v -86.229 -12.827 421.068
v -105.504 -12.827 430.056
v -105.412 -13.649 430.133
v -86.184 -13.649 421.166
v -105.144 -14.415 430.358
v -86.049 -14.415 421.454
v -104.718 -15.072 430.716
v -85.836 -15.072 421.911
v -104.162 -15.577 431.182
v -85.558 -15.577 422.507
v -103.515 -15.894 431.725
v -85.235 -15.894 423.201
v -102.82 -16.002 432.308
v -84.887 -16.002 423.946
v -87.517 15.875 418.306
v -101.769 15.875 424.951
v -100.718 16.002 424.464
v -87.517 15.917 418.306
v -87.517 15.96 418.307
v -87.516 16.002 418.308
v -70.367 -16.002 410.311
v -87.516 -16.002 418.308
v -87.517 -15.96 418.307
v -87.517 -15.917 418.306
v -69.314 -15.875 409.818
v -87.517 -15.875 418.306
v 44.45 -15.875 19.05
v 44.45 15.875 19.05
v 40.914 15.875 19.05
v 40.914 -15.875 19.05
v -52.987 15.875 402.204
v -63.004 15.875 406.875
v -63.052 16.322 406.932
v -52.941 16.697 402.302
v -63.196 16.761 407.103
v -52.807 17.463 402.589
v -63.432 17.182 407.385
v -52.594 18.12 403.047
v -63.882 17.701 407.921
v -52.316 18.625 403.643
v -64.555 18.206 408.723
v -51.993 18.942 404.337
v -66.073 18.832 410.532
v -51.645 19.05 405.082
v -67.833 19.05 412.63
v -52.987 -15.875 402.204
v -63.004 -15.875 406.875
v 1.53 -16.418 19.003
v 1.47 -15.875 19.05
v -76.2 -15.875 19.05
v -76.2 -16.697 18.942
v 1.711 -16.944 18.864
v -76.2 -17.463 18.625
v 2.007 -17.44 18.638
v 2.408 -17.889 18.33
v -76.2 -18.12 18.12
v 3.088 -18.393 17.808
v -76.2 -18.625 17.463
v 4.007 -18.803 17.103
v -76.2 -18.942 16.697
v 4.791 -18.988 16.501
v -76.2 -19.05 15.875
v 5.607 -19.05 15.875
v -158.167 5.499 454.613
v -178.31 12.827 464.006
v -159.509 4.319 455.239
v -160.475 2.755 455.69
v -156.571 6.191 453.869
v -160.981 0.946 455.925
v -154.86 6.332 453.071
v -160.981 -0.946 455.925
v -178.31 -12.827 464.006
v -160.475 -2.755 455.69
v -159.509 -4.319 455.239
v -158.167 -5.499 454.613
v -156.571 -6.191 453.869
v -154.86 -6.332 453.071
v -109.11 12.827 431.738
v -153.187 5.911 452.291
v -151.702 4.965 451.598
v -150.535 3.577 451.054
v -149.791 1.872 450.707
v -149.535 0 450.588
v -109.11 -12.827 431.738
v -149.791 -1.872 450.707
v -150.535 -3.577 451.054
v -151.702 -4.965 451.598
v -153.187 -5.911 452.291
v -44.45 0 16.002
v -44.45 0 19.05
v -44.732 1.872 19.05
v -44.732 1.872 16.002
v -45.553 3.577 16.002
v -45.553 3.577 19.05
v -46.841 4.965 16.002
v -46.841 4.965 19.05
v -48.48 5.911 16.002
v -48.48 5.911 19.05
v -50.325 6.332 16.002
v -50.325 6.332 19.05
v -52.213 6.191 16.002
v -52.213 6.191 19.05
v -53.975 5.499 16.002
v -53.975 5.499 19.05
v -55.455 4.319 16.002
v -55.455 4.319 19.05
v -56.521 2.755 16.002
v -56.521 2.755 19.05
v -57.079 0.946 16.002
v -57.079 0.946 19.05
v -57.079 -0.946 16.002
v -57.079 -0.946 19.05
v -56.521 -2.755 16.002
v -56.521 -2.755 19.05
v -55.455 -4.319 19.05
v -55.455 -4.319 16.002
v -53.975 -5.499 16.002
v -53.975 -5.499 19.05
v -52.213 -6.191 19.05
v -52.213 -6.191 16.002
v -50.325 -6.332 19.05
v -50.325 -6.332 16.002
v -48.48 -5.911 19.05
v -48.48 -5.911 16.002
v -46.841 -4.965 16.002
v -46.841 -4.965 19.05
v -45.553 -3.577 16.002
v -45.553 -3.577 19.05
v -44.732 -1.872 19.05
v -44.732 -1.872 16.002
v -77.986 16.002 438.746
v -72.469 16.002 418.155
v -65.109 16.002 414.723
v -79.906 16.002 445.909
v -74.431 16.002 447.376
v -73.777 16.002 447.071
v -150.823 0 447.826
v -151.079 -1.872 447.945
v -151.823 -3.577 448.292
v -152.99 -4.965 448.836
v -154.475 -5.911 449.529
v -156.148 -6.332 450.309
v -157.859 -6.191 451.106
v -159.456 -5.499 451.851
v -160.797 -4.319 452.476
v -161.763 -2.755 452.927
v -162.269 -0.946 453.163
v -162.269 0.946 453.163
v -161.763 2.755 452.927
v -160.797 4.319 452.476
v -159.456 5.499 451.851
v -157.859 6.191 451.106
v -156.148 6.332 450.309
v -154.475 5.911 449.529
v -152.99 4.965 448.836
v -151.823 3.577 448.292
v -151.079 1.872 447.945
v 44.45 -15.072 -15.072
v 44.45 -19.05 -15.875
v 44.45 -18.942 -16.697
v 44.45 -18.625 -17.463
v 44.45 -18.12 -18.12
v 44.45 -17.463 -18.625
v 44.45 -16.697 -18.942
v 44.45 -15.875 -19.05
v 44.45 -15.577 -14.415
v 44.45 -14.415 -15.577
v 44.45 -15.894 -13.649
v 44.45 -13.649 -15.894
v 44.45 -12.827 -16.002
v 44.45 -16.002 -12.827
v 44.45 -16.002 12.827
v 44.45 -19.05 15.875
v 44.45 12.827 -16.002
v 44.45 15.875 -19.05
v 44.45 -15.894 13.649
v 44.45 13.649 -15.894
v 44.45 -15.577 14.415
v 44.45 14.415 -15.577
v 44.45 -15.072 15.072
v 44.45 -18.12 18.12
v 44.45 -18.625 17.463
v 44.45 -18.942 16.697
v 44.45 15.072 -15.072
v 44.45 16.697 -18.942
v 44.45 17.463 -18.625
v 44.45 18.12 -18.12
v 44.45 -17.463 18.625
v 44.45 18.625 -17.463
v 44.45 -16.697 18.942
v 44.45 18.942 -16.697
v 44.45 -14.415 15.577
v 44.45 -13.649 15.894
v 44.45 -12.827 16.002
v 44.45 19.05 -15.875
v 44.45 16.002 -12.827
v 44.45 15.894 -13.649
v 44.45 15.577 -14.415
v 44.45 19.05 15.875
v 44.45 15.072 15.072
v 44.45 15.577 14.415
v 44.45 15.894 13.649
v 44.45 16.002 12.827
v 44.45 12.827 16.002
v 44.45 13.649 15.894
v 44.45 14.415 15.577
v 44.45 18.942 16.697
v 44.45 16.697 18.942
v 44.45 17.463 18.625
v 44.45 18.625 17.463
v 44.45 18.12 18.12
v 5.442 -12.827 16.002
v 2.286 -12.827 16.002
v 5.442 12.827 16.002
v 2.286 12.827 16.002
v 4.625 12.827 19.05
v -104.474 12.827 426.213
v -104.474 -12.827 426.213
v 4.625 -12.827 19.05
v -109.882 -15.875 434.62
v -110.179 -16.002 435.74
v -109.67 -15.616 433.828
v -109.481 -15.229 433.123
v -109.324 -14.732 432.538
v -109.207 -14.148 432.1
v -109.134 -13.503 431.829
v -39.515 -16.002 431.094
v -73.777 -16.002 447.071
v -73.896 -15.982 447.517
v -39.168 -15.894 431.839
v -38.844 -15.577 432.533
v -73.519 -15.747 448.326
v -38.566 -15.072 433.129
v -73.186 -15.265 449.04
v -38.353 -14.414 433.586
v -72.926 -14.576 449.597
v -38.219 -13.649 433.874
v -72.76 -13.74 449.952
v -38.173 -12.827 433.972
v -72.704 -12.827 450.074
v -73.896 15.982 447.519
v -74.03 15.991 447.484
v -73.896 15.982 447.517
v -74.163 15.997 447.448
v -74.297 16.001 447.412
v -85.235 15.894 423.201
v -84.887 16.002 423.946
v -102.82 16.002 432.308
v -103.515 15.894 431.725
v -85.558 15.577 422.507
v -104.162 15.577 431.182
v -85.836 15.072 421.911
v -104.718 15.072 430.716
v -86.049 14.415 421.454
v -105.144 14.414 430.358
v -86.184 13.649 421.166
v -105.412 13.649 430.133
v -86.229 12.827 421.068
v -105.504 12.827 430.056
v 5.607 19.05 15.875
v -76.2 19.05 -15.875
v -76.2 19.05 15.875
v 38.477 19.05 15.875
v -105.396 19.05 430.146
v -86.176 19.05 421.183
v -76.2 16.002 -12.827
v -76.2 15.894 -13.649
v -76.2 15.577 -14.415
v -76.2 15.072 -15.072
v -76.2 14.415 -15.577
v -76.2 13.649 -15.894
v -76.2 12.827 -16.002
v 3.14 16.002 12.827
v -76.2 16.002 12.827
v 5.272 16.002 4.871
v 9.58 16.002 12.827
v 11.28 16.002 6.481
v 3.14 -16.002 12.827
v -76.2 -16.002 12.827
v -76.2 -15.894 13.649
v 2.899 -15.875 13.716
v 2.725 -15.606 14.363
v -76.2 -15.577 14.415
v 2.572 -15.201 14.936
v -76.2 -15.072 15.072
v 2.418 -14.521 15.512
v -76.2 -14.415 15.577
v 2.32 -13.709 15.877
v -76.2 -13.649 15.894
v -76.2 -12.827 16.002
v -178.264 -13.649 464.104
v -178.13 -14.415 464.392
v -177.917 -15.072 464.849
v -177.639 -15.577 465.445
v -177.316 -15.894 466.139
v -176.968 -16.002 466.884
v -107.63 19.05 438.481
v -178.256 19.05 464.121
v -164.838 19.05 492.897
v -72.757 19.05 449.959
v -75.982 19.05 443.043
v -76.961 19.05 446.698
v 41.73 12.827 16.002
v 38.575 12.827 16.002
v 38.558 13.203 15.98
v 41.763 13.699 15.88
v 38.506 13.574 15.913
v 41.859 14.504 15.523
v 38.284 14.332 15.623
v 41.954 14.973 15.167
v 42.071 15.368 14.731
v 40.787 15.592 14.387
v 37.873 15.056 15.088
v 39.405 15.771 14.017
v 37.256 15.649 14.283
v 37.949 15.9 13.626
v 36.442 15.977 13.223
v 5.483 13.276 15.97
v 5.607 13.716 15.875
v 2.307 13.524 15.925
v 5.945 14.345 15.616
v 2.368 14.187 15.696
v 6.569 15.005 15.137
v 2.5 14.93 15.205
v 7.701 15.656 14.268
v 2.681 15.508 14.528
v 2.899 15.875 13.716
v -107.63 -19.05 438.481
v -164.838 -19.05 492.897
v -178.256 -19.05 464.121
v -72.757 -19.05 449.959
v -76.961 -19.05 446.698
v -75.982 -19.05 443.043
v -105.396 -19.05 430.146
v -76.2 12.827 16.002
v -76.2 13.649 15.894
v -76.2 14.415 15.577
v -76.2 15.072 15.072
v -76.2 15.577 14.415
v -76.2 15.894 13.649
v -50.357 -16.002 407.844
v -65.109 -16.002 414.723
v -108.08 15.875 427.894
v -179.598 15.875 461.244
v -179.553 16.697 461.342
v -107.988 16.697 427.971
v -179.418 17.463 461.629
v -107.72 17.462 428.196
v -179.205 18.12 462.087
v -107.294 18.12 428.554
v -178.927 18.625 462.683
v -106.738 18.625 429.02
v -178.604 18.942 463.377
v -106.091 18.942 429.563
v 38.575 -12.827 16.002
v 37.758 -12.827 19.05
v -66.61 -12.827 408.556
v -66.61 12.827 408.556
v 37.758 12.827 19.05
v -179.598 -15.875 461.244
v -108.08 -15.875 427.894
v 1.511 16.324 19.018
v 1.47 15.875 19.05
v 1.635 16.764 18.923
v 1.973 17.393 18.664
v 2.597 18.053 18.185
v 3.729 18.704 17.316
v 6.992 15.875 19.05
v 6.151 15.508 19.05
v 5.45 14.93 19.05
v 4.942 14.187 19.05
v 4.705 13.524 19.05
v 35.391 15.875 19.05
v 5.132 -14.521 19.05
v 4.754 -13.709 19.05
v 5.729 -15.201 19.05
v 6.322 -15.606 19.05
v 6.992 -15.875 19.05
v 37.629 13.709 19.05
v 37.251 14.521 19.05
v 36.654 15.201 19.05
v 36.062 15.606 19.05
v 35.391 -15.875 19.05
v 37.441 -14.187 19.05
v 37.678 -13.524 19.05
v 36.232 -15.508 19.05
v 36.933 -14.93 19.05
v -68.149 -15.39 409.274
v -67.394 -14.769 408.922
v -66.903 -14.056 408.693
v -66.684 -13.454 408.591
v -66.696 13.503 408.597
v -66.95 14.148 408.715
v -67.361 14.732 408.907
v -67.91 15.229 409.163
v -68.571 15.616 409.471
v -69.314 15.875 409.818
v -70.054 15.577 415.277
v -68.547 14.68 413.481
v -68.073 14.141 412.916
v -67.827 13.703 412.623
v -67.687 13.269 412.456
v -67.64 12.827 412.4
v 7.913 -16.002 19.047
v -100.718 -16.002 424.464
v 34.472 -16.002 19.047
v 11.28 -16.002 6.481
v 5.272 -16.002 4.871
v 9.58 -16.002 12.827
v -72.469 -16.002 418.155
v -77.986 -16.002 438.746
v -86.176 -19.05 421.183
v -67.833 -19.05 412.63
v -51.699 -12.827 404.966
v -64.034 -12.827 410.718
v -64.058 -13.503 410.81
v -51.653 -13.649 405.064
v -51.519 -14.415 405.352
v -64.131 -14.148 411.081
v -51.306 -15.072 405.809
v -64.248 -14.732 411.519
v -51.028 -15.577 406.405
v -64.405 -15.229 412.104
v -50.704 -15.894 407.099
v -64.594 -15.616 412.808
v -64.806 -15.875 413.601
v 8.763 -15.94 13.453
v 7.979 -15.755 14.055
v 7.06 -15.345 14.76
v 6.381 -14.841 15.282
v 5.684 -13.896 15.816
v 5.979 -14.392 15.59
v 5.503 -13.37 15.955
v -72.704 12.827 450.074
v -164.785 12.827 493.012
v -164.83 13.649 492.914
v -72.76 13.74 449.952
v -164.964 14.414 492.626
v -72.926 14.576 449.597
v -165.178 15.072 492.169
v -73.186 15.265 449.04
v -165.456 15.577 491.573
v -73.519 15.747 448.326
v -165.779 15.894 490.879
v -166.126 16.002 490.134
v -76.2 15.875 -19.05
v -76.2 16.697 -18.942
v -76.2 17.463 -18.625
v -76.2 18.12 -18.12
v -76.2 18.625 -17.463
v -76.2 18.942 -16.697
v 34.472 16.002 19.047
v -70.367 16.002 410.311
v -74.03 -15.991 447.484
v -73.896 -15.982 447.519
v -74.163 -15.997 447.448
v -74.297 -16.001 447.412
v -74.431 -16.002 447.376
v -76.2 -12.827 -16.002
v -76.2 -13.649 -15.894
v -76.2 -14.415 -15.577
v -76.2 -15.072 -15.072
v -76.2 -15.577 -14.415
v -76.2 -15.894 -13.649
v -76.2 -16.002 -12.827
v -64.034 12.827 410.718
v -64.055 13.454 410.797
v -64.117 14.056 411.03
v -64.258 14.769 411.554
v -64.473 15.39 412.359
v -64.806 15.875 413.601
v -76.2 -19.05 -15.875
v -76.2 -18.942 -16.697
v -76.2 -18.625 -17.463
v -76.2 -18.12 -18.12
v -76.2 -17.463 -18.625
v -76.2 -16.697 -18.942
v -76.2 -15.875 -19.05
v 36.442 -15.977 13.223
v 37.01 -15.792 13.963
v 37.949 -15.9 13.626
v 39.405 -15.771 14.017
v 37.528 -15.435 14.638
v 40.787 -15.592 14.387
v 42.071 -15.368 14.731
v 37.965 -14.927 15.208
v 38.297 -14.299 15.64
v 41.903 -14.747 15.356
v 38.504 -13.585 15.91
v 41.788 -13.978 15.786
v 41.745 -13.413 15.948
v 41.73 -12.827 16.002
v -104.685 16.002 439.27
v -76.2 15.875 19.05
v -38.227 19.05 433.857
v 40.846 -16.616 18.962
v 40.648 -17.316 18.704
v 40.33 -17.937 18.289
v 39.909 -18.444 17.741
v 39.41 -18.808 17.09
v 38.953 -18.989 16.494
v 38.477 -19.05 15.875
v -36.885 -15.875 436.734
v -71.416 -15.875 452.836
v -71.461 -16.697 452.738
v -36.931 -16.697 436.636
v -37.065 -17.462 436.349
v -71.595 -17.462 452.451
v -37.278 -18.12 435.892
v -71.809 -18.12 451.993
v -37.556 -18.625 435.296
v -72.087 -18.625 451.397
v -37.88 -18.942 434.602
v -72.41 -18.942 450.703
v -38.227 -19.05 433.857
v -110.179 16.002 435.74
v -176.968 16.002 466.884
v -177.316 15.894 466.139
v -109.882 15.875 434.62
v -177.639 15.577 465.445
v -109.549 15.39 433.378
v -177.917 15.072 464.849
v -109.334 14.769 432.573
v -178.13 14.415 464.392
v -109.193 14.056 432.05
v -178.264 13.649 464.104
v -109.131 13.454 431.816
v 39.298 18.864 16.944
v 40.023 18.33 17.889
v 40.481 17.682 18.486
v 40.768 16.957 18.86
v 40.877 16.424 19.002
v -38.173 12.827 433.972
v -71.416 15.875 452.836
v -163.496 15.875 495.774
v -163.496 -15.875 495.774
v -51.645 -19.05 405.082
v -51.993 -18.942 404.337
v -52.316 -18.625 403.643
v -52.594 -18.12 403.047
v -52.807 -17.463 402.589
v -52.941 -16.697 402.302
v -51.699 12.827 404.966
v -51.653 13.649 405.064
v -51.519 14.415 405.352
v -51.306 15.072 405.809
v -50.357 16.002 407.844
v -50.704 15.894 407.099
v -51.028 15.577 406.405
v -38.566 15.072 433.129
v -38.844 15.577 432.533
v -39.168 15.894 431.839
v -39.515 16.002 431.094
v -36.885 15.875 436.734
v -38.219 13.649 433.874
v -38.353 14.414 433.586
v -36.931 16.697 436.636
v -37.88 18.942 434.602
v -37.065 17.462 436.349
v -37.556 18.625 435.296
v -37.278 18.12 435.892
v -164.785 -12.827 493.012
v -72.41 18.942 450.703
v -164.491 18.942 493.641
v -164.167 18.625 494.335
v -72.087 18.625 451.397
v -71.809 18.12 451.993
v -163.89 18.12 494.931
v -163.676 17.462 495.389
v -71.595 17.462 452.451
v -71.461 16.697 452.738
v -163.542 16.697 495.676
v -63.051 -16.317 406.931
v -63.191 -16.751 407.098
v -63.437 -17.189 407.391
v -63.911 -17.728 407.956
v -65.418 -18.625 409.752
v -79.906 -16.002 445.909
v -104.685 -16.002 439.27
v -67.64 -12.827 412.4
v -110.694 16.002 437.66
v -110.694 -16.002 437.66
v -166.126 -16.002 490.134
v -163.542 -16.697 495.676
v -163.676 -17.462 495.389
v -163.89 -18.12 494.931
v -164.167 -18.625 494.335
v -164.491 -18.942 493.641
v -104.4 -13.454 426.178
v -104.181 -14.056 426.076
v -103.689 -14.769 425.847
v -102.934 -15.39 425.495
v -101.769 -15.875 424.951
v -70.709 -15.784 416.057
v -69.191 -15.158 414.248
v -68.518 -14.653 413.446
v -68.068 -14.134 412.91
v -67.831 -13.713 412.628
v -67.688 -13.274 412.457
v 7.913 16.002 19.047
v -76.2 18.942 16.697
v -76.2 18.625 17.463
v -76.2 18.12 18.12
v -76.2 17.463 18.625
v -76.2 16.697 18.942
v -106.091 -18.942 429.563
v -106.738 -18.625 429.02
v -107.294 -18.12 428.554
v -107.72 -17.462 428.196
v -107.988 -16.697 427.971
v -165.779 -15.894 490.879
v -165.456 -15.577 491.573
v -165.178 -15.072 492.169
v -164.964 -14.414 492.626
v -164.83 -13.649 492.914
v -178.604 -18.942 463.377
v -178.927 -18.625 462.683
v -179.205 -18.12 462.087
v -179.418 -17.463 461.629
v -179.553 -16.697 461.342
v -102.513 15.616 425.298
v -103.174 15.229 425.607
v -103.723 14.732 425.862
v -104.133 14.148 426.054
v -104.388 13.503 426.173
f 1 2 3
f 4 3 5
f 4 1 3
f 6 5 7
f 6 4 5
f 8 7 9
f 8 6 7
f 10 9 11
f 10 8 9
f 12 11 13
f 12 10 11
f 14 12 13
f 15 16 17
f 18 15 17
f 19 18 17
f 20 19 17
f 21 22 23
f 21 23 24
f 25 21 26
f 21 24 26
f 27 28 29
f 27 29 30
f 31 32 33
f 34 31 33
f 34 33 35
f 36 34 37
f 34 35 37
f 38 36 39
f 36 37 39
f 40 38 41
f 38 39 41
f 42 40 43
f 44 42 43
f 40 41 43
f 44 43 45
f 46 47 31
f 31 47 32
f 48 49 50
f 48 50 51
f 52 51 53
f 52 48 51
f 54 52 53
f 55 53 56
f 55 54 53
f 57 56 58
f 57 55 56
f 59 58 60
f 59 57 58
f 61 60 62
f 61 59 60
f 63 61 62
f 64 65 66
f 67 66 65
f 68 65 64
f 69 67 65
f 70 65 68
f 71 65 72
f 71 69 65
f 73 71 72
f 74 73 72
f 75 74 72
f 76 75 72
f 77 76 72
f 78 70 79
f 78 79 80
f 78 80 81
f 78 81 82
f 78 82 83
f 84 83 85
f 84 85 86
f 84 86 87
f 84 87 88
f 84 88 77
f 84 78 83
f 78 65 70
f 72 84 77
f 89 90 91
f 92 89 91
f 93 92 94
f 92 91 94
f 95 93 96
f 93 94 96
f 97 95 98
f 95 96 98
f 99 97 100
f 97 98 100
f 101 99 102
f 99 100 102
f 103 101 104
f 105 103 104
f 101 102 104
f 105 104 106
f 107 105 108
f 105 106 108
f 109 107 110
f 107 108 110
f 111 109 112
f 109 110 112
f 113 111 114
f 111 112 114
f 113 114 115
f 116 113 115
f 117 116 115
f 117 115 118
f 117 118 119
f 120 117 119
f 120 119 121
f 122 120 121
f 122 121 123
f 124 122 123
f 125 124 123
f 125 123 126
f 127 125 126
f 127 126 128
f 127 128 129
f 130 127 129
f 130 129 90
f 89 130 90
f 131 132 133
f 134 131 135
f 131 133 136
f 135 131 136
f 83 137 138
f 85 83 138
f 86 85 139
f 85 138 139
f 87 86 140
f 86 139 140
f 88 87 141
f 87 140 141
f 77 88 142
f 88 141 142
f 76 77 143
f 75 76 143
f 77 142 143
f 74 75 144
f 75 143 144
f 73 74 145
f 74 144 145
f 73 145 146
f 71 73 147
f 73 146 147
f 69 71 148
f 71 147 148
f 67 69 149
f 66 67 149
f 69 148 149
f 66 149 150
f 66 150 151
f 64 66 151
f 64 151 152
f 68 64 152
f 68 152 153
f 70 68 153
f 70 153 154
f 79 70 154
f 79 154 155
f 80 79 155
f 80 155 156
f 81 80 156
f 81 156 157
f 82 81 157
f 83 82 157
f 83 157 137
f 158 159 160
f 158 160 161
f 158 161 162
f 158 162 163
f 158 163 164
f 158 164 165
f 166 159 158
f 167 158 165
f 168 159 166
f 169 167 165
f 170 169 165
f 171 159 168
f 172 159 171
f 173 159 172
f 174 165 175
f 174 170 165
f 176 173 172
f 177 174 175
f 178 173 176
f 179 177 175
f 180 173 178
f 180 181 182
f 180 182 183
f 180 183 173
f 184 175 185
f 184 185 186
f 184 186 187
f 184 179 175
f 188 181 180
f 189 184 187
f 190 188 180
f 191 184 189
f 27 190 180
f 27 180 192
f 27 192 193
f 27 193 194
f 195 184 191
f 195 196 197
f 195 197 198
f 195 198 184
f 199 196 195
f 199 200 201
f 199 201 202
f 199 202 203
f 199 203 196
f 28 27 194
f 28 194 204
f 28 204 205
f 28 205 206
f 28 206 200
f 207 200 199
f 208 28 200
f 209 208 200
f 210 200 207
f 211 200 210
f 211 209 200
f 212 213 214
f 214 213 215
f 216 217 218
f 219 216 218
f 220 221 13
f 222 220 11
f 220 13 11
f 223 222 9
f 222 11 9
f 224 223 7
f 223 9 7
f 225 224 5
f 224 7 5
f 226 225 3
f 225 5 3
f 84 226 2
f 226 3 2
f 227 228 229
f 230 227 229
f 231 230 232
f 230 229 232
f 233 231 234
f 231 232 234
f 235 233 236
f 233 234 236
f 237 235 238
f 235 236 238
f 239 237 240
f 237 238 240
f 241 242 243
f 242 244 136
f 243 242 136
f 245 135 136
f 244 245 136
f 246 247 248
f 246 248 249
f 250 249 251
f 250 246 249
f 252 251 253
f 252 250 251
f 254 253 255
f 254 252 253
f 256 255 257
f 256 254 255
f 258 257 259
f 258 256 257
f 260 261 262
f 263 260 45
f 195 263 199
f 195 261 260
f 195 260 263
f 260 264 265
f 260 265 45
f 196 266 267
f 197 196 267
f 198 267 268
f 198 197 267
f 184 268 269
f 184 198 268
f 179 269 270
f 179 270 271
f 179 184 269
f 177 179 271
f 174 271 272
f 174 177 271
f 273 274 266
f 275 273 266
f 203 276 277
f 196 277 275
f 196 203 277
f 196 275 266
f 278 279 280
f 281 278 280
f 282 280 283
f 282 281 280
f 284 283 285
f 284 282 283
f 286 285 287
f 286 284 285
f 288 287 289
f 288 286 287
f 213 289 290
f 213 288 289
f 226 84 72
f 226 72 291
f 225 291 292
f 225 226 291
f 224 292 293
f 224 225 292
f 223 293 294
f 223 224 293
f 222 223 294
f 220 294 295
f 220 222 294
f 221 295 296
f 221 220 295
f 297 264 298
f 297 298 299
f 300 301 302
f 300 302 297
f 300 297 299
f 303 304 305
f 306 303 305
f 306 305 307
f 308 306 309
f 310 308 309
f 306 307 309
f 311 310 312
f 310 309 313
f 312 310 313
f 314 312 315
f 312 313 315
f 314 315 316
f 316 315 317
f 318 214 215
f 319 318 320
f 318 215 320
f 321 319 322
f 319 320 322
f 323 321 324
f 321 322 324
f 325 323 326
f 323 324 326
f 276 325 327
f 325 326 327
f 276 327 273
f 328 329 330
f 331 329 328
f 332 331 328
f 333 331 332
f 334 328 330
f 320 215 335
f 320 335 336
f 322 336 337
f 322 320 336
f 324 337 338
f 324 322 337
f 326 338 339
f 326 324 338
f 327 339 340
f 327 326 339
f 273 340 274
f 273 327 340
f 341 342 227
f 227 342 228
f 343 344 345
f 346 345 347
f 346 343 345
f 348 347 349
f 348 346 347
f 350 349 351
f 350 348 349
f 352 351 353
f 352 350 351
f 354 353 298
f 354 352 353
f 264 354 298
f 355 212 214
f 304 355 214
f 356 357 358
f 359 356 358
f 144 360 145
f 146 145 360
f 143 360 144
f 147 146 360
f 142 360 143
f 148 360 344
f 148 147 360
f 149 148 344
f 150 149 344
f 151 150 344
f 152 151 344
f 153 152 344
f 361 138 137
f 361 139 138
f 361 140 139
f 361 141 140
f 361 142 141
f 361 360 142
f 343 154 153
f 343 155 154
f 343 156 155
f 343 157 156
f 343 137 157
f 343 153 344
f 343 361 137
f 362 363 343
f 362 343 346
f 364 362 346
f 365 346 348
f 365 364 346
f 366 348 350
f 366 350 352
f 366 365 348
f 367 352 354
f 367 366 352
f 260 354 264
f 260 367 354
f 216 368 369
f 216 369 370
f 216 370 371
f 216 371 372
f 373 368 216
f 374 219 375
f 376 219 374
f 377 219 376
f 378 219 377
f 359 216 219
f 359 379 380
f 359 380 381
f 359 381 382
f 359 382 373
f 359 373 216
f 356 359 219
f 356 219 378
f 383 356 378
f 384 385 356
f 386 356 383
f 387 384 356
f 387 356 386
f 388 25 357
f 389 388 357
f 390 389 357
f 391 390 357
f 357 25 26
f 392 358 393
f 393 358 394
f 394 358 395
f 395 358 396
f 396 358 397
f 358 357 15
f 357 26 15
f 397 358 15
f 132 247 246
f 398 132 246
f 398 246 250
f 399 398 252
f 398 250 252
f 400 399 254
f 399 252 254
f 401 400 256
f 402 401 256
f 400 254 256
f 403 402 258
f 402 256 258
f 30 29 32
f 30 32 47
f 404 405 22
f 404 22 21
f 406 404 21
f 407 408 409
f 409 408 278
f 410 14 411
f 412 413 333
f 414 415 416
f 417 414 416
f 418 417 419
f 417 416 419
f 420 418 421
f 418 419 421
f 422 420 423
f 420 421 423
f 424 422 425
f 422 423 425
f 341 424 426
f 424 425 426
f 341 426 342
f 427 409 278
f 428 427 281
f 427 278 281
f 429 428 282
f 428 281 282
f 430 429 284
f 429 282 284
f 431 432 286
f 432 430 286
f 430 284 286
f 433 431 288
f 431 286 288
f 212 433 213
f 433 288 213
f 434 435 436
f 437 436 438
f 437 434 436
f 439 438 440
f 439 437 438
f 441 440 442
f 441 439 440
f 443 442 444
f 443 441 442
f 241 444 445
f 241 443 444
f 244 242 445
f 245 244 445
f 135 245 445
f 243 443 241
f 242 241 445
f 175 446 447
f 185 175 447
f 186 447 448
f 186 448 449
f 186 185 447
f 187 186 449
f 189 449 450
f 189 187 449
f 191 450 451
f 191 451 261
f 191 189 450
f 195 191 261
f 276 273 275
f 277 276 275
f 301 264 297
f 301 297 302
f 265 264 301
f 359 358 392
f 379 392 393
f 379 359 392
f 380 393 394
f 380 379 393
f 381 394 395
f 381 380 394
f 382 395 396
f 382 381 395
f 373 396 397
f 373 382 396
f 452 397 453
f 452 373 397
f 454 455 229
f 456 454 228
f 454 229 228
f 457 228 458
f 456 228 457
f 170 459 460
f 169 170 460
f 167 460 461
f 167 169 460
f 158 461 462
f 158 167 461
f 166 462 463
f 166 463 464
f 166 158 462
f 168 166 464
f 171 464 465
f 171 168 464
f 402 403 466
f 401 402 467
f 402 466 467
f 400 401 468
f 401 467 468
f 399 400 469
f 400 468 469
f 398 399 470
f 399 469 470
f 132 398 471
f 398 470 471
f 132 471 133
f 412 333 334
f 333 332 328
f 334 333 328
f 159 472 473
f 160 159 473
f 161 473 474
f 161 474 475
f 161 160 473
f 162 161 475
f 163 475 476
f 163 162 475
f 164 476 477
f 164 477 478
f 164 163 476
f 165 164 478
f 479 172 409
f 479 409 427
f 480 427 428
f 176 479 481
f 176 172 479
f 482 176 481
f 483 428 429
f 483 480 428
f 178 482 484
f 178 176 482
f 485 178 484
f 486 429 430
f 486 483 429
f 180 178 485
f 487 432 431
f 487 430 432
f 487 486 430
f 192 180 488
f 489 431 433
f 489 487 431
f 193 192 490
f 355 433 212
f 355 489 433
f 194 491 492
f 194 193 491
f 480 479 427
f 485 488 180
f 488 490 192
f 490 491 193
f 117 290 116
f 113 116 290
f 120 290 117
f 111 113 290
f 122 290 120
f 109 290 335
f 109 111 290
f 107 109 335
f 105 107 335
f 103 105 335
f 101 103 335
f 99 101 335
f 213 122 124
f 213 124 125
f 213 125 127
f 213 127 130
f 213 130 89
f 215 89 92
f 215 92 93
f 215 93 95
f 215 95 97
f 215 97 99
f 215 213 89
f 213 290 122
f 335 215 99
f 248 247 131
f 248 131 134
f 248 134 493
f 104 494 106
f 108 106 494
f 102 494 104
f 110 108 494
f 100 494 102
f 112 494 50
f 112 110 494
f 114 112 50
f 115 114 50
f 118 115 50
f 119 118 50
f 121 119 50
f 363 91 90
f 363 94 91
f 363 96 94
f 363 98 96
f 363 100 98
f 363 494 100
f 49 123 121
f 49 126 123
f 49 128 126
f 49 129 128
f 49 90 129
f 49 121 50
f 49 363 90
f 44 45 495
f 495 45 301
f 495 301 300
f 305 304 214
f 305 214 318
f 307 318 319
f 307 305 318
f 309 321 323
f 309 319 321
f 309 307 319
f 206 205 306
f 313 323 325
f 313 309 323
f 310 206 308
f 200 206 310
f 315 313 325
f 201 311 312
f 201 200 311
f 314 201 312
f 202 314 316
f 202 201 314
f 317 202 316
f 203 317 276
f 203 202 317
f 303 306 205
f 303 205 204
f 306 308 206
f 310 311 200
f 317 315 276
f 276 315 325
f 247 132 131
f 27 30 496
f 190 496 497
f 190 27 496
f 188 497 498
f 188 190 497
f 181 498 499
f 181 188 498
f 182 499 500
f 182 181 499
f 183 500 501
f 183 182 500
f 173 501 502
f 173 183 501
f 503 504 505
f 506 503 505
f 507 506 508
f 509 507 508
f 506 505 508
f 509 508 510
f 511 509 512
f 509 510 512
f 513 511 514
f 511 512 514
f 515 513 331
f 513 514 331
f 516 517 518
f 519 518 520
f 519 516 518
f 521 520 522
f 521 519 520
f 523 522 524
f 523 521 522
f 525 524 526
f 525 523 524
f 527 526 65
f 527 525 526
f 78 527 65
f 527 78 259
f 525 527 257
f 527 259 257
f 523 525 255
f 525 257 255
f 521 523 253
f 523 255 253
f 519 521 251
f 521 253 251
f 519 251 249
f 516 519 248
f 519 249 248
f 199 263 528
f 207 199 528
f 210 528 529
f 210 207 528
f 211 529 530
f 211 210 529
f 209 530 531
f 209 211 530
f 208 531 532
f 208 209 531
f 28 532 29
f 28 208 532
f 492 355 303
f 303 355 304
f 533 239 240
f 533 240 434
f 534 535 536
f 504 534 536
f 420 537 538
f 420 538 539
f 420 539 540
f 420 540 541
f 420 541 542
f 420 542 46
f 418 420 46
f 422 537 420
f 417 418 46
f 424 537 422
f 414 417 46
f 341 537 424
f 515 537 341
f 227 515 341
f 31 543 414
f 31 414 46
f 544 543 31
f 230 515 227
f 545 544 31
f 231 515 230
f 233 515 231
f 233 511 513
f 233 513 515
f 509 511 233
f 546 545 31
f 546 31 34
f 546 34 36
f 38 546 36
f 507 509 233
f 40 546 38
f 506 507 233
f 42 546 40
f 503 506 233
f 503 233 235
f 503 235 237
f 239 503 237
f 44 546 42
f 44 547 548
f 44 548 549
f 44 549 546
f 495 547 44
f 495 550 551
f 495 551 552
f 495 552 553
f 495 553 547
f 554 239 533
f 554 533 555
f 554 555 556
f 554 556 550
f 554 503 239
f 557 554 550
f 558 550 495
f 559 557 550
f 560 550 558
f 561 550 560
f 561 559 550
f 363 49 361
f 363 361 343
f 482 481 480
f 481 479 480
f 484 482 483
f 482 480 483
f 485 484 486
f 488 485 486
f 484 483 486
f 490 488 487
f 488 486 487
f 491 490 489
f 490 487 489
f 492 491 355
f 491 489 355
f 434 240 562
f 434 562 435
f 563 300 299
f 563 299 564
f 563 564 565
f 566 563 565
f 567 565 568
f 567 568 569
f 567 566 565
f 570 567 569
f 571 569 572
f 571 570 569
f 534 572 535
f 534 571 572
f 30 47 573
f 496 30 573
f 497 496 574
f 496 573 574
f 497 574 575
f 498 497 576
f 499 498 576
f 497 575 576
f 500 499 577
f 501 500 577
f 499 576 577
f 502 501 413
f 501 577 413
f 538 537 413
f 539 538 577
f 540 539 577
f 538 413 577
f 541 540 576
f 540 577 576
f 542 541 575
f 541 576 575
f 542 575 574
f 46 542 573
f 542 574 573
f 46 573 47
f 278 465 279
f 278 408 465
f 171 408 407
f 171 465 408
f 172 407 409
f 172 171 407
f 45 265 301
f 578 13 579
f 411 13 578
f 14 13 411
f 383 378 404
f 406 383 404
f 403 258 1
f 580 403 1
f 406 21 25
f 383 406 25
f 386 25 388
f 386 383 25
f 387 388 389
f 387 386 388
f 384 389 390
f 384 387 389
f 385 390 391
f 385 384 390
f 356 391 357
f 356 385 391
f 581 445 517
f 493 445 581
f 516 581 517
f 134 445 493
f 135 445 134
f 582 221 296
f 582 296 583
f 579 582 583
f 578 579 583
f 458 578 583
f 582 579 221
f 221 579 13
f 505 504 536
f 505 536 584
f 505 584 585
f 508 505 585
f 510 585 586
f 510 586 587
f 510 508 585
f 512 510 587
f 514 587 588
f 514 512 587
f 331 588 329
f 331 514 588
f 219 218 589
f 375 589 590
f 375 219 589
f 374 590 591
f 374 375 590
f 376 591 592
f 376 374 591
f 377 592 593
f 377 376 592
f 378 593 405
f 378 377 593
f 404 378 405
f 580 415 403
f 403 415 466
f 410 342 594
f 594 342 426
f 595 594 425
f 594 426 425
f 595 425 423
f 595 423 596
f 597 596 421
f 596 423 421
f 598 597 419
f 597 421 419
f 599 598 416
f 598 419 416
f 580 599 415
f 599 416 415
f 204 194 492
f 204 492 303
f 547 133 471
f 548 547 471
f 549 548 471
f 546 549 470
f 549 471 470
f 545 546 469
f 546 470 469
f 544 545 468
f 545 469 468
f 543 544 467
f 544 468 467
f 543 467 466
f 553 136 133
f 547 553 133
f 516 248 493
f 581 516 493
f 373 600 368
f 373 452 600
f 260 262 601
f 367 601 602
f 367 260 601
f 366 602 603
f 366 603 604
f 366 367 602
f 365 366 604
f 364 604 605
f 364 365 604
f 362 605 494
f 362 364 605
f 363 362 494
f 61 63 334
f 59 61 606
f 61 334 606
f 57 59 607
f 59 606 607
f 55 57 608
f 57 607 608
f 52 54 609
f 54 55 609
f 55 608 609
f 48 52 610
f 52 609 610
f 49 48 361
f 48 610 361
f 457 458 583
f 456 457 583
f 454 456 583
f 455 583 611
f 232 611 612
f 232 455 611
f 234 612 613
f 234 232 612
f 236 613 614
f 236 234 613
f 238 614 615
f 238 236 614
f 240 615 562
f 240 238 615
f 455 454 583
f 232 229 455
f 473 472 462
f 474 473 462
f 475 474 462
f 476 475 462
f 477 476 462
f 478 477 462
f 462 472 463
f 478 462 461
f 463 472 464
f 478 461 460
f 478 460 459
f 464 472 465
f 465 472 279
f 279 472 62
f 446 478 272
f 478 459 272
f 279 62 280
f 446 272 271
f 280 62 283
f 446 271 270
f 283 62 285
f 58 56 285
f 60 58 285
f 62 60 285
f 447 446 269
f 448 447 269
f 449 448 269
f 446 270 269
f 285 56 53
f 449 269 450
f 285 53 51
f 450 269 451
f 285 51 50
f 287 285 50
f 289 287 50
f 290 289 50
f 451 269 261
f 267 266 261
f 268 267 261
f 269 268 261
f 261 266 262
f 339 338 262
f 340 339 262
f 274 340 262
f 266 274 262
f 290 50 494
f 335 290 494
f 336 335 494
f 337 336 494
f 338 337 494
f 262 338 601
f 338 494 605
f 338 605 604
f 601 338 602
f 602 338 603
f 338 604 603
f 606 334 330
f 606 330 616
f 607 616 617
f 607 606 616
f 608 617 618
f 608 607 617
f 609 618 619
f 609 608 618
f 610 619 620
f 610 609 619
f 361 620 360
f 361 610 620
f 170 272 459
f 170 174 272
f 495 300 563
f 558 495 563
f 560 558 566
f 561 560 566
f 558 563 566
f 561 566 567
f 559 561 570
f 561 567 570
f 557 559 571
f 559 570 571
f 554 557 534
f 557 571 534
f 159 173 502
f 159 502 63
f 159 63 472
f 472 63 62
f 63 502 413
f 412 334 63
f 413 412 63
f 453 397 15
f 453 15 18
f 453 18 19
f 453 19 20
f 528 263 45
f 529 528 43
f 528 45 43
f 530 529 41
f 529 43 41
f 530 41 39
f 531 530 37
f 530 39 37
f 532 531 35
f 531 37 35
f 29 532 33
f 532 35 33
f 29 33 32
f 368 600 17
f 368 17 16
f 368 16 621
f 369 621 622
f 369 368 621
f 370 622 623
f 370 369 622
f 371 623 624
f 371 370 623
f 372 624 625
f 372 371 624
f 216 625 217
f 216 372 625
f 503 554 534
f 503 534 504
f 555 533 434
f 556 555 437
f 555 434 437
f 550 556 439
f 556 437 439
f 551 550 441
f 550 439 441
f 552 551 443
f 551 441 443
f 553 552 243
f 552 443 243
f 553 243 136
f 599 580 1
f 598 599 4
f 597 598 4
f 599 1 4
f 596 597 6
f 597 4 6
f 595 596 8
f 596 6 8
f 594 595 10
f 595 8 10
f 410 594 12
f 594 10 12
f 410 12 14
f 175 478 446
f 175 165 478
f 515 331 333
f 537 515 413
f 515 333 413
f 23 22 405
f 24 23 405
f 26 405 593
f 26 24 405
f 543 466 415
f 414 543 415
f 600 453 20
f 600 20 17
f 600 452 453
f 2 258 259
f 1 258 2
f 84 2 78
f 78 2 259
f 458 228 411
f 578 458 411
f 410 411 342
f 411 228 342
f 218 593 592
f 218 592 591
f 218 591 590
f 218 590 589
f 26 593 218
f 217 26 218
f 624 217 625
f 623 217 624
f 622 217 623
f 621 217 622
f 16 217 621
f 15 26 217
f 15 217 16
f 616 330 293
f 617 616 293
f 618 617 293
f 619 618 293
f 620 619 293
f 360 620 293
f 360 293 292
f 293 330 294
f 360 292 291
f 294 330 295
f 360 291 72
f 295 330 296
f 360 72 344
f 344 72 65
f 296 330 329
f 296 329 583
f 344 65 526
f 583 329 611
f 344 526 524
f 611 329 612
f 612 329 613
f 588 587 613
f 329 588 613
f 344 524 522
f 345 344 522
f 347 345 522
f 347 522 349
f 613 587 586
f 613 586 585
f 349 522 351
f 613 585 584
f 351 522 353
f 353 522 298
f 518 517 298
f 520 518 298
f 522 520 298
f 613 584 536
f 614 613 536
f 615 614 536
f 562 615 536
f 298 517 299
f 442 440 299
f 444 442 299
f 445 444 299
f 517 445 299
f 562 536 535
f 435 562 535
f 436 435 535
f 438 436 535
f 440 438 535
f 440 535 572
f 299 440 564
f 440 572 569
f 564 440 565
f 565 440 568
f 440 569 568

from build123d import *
from build123d import SkipClean  # not in build123d's __all__

# Parameters (mm, degrees)
F1_DEPTH       = 44.45
F1_DEPTH_BACK  = 76.2
F5_DEPTH       = 419.1
F5_DEPTH_BACK  = 28.956
F7_DEPTH       = 145.288
F10_DEPTH      = 38.1
F10_DEPTH_BACK = 101.6
F12_DEPTH      = 154.2941466414
F13_R          = 6.35
F14_DEPTH      = 6.35
F15_R          = 6.35
F16_DEPTH      = 6.35


with BuildPart() as f1:
    # F0 (on Right) → F1 (new body, two sides)
    with BuildSketch(Plane.YZ) as f1_sk:
        with BuildLine():
            ThreePointArc((19.05, 15.875), (18.1200640303, 18.1200640303), (15.875, 19.05))
            Line((15.875, 19.05), (-15.875, 19.05))
            ThreePointArc((-15.875, 19.05), (-18.1200640303, 18.1200640303), (-19.05, 15.875))
            Line((-19.05, 15.875), (-19.05, -15.875))
            ThreePointArc((-19.05, -15.875), (-18.1200640303, -18.1200640303), (-15.875, -19.05))
            Line((-15.875, -19.05), (15.875, -19.05))
            ThreePointArc((15.875, -19.05), (18.1200640303, -18.1200640303), (19.05, -15.875))
            Line((19.05, -15.875), (19.05, 15.875))
        make_face()
        with BuildLine():
            Line((-16.002, -12.827), (-16.002, 12.827))
            ThreePointArc((-16.002, 12.827), (-15.0720640303, 15.0720640303), (-12.827, 16.002))
            Line((-12.827, 16.002), (12.827, 16.002))
            ThreePointArc((12.827, 16.002), (15.0720640303, 15.0720640303), (16.002, 12.827))
            Line((16.002, 12.827), (16.002, -12.827))
            ThreePointArc((16.002, -12.827), (15.0720640303, -15.0720640303), (12.827, -16.002))
            Line((12.827, -16.002), (-12.827, -16.002))
            ThreePointArc((-12.827, -16.002), (-15.0720640303, -15.0720640303), (-16.002, -12.827))
        make_face(mode=Mode.SUBTRACT)
    extrude(amount=F1_DEPTH)
    extrude(f1_sk.sketch, amount=-F1_DEPTH_BACK)

    # F4 (on face) → F5 (join, two sides)
    with BuildSketch(Plane(origin=(-8.3589183447, 0, 31.1959079588), x_dir=(0.9659258263, 0, 0.2588190451), z_dir=(0.2588190451, 0, -0.9659258263))) as f5_sk:
        with BuildLine():
            ThreePointArc((44.45, 15.875), (43.5200640303, 18.1200640303), (41.275, 19.05))
            Line((41.275, 19.05), (9.525, 19.05))
            ThreePointArc((9.525, 19.05), (7.2799359697, 18.1200640303), (6.35, 15.875))
            Line((6.35, 15.875), (6.35, -15.875))
            ThreePointArc((6.35, -15.875), (7.2799359697, -18.1200640303), (9.525, -19.05))
            Line((9.525, -19.05), (41.275, -19.05))
            ThreePointArc((41.275, -19.05), (43.5200640303, -18.1200640303), (44.45, -15.875))
            Line((44.45, -15.875), (44.45, 15.875))
        make_face()
        with BuildLine():
            Line((12.573, 16.002), (38.227, 16.002))
            ThreePointArc((38.227, 16.002), (40.4720640303, 15.0720640303), (41.402, 12.827))
            Line((41.402, 12.827), (41.402, -12.827))
            ThreePointArc((41.402, -12.827), (40.4720640303, -15.0720640303), (38.227, -16.002))
            Line((38.227, -16.002), (12.573, -16.002))
            ThreePointArc((12.573, -16.002), (10.3279359697, -15.0720640303), (9.398, -12.827))
            Line((9.398, -12.827), (9.398, 12.827))
            ThreePointArc((9.398, 12.827), (10.3279359697, 15.0720640303), (12.573, 16.002))
        make_face(mode=Mode.SUBTRACT)
    extrude(amount=-F5_DEPTH)
    extrude(f5_sk.sketch, amount=F5_DEPTH_BACK)

    # F6 (on face) → F7 (cut)
    with BuildSketch(Plane(origin=(-76.2, 0, 0), x_dir=(0, -1, 0), z_dir=(-1, 0, 0))):
        with BuildLine():
            Line((12.827, 16.002), (-12.827, 16.002))
            ThreePointArc((-12.827, 16.002), (-15.0720640303, 15.0720640303), (-16.002, 12.827))
            Line((-16.002, 12.827), (-16.002, -12.827))
            ThreePointArc((-16.002, -12.827), (-15.0720640303, -15.0720640303), (-12.827, -16.002))
            Line((-12.827, -16.002), (12.827, -16.002))
            ThreePointArc((12.827, -16.002), (15.0720640303, -15.0720640303), (16.002, -12.827))
            Line((16.002, -12.827), (16.002, 12.827))
            ThreePointArc((16.002, 12.827), (15.0720640303, 15.0720640303), (12.827, 16.002))
        make_face()
    with SkipClean():  # cleaning this boolean's faces spoils the solid; the shape is the same uncleaned
        extrude(amount=-F7_DEPTH, mode=Mode.SUBTRACT)

    # F9 (on face) → F10 (join, two sides)
    with BuildSketch(Plane(origin=(-232.1066250318, 0, 108.2330967608), x_dir=(0, 1, 0), z_dir=(0.906307787, 0, -0.4226182617))) as f10_sk:
        with BuildLine():
            ThreePointArc((19.05, 377.0523048448), (18.1200640303, 379.297368875), (15.875, 380.2273048448))
            Line((15.875, 380.2273048448), (-15.875, 380.2273048448))
            ThreePointArc((-15.875, 380.2273048448), (-18.1200640303, 379.297368875), (-19.05, 377.0523048448))
            Line((-19.05, 377.0523048448), (-19.05, 345.3023048448))
            ThreePointArc((-19.05, 345.3023048448), (-18.1200640303, 343.0572408145), (-15.875, 342.1273048448))
            Line((-15.875, 342.1273048448), (15.875, 342.1273048448))
            ThreePointArc((15.875, 342.1273048448), (18.1200640303, 343.0572408145), (19.05, 345.3023048448))
            Line((19.05, 345.3023048448), (19.05, 377.0523048448))
        make_face()
        with BuildLine():
            Line((-12.827, 377.1793048448), (12.827, 377.1793048448))
            ThreePointArc((12.827, 377.1793048448), (15.0720640303, 376.249368875), (16.002, 374.0043048448))
            Line((16.002, 374.0043048448), (16.002, 348.3503048448))
            ThreePointArc((16.002, 348.3503048448), (15.0720640303, 346.1052408145), (12.827, 345.1753048448))
            Line((12.827, 345.1753048448), (-12.827, 345.1753048448))
            ThreePointArc((-12.827, 345.1753048448), (-15.0720640303, 346.1052408145), (-16.002, 348.3503048448))
            Line((-16.002, 348.3503048448), (-16.002, 374.0043048448))
            ThreePointArc((-16.002, 374.0043048448), (-15.0720640303, 376.249368875), (-12.827, 377.1793048448))
        make_face(mode=Mode.SUBTRACT)
    with SkipClean():  # cleaning this boolean's faces spoils the solid; the shape is the same uncleaned
        extrude(amount=F10_DEPTH)
        extrude(f10_sk.sketch, amount=-F10_DEPTH_BACK)

    # F11 (on face) → F12 (cut, through all)
    with BuildSketch(Plane(origin=(-197.5762983457, 0, 92.1313409885), x_dir=(0, 1, 0), z_dir=(0.906307787, 0, -0.4226182617))):
        with BuildLine():
            ThreePointArc((-12.827, 377.1793048448), (-15.0720640303, 376.249368875), (-16.002, 374.0043048448))
            Line((-16.002, 374.0043048448), (-16.002, 348.3503048448))
            ThreePointArc((-16.002, 348.3503048448), (-15.0720640303, 346.1052408145), (-12.827, 345.1753048448))
            Line((-12.827, 345.1753048448), (12.827, 345.1753048448))
            ThreePointArc((12.827, 345.1753048448), (15.0720640303, 346.1052408145), (16.002, 348.3503048448))
            Line((16.002, 348.3503048448), (16.002, 374.0043048448))
            ThreePointArc((16.002, 374.0043048448), (15.0720640303, 376.249368875), (12.827, 377.1793048448))
            Line((12.827, 377.1793048448), (-12.827, 377.1793048448))
        make_face()
    with SkipClean():  # cleaning this boolean's faces spoils the solid; the shape is the same uncleaned
        extrude(amount=-F12_DEPTH, mode=Mode.SUBTRACT)

    # F13 (on face) → F14 (cut)
    with BuildSketch(Plane.XY.offset(19.05)):
        with Locations((-50.8, 0)):
            Circle(F13_R)
    with SkipClean():  # cleaning this boolean's faces spoils the solid; the shape is the same uncleaned
        extrude(amount=-F14_DEPTH, mode=Mode.SUBTRACT)

    # F15 (on face) → F16 (cut)
    with BuildSketch(Plane(origin=(144.5892468675, 0, 310.0726405387), x_dir=(0.906307787, 0, -0.4226182617), z_dir=(-0.4226182617, 0, -0.906307787))):
        with Locations((-332.301324905, 0)):
            Circle(F15_R)
    with SkipClean():  # cleaning this boolean's faces spoils the solid; the shape is the same uncleaned
        extrude(amount=-F16_DEPTH, mode=Mode.SUBTRACT)


solid = f1.part
